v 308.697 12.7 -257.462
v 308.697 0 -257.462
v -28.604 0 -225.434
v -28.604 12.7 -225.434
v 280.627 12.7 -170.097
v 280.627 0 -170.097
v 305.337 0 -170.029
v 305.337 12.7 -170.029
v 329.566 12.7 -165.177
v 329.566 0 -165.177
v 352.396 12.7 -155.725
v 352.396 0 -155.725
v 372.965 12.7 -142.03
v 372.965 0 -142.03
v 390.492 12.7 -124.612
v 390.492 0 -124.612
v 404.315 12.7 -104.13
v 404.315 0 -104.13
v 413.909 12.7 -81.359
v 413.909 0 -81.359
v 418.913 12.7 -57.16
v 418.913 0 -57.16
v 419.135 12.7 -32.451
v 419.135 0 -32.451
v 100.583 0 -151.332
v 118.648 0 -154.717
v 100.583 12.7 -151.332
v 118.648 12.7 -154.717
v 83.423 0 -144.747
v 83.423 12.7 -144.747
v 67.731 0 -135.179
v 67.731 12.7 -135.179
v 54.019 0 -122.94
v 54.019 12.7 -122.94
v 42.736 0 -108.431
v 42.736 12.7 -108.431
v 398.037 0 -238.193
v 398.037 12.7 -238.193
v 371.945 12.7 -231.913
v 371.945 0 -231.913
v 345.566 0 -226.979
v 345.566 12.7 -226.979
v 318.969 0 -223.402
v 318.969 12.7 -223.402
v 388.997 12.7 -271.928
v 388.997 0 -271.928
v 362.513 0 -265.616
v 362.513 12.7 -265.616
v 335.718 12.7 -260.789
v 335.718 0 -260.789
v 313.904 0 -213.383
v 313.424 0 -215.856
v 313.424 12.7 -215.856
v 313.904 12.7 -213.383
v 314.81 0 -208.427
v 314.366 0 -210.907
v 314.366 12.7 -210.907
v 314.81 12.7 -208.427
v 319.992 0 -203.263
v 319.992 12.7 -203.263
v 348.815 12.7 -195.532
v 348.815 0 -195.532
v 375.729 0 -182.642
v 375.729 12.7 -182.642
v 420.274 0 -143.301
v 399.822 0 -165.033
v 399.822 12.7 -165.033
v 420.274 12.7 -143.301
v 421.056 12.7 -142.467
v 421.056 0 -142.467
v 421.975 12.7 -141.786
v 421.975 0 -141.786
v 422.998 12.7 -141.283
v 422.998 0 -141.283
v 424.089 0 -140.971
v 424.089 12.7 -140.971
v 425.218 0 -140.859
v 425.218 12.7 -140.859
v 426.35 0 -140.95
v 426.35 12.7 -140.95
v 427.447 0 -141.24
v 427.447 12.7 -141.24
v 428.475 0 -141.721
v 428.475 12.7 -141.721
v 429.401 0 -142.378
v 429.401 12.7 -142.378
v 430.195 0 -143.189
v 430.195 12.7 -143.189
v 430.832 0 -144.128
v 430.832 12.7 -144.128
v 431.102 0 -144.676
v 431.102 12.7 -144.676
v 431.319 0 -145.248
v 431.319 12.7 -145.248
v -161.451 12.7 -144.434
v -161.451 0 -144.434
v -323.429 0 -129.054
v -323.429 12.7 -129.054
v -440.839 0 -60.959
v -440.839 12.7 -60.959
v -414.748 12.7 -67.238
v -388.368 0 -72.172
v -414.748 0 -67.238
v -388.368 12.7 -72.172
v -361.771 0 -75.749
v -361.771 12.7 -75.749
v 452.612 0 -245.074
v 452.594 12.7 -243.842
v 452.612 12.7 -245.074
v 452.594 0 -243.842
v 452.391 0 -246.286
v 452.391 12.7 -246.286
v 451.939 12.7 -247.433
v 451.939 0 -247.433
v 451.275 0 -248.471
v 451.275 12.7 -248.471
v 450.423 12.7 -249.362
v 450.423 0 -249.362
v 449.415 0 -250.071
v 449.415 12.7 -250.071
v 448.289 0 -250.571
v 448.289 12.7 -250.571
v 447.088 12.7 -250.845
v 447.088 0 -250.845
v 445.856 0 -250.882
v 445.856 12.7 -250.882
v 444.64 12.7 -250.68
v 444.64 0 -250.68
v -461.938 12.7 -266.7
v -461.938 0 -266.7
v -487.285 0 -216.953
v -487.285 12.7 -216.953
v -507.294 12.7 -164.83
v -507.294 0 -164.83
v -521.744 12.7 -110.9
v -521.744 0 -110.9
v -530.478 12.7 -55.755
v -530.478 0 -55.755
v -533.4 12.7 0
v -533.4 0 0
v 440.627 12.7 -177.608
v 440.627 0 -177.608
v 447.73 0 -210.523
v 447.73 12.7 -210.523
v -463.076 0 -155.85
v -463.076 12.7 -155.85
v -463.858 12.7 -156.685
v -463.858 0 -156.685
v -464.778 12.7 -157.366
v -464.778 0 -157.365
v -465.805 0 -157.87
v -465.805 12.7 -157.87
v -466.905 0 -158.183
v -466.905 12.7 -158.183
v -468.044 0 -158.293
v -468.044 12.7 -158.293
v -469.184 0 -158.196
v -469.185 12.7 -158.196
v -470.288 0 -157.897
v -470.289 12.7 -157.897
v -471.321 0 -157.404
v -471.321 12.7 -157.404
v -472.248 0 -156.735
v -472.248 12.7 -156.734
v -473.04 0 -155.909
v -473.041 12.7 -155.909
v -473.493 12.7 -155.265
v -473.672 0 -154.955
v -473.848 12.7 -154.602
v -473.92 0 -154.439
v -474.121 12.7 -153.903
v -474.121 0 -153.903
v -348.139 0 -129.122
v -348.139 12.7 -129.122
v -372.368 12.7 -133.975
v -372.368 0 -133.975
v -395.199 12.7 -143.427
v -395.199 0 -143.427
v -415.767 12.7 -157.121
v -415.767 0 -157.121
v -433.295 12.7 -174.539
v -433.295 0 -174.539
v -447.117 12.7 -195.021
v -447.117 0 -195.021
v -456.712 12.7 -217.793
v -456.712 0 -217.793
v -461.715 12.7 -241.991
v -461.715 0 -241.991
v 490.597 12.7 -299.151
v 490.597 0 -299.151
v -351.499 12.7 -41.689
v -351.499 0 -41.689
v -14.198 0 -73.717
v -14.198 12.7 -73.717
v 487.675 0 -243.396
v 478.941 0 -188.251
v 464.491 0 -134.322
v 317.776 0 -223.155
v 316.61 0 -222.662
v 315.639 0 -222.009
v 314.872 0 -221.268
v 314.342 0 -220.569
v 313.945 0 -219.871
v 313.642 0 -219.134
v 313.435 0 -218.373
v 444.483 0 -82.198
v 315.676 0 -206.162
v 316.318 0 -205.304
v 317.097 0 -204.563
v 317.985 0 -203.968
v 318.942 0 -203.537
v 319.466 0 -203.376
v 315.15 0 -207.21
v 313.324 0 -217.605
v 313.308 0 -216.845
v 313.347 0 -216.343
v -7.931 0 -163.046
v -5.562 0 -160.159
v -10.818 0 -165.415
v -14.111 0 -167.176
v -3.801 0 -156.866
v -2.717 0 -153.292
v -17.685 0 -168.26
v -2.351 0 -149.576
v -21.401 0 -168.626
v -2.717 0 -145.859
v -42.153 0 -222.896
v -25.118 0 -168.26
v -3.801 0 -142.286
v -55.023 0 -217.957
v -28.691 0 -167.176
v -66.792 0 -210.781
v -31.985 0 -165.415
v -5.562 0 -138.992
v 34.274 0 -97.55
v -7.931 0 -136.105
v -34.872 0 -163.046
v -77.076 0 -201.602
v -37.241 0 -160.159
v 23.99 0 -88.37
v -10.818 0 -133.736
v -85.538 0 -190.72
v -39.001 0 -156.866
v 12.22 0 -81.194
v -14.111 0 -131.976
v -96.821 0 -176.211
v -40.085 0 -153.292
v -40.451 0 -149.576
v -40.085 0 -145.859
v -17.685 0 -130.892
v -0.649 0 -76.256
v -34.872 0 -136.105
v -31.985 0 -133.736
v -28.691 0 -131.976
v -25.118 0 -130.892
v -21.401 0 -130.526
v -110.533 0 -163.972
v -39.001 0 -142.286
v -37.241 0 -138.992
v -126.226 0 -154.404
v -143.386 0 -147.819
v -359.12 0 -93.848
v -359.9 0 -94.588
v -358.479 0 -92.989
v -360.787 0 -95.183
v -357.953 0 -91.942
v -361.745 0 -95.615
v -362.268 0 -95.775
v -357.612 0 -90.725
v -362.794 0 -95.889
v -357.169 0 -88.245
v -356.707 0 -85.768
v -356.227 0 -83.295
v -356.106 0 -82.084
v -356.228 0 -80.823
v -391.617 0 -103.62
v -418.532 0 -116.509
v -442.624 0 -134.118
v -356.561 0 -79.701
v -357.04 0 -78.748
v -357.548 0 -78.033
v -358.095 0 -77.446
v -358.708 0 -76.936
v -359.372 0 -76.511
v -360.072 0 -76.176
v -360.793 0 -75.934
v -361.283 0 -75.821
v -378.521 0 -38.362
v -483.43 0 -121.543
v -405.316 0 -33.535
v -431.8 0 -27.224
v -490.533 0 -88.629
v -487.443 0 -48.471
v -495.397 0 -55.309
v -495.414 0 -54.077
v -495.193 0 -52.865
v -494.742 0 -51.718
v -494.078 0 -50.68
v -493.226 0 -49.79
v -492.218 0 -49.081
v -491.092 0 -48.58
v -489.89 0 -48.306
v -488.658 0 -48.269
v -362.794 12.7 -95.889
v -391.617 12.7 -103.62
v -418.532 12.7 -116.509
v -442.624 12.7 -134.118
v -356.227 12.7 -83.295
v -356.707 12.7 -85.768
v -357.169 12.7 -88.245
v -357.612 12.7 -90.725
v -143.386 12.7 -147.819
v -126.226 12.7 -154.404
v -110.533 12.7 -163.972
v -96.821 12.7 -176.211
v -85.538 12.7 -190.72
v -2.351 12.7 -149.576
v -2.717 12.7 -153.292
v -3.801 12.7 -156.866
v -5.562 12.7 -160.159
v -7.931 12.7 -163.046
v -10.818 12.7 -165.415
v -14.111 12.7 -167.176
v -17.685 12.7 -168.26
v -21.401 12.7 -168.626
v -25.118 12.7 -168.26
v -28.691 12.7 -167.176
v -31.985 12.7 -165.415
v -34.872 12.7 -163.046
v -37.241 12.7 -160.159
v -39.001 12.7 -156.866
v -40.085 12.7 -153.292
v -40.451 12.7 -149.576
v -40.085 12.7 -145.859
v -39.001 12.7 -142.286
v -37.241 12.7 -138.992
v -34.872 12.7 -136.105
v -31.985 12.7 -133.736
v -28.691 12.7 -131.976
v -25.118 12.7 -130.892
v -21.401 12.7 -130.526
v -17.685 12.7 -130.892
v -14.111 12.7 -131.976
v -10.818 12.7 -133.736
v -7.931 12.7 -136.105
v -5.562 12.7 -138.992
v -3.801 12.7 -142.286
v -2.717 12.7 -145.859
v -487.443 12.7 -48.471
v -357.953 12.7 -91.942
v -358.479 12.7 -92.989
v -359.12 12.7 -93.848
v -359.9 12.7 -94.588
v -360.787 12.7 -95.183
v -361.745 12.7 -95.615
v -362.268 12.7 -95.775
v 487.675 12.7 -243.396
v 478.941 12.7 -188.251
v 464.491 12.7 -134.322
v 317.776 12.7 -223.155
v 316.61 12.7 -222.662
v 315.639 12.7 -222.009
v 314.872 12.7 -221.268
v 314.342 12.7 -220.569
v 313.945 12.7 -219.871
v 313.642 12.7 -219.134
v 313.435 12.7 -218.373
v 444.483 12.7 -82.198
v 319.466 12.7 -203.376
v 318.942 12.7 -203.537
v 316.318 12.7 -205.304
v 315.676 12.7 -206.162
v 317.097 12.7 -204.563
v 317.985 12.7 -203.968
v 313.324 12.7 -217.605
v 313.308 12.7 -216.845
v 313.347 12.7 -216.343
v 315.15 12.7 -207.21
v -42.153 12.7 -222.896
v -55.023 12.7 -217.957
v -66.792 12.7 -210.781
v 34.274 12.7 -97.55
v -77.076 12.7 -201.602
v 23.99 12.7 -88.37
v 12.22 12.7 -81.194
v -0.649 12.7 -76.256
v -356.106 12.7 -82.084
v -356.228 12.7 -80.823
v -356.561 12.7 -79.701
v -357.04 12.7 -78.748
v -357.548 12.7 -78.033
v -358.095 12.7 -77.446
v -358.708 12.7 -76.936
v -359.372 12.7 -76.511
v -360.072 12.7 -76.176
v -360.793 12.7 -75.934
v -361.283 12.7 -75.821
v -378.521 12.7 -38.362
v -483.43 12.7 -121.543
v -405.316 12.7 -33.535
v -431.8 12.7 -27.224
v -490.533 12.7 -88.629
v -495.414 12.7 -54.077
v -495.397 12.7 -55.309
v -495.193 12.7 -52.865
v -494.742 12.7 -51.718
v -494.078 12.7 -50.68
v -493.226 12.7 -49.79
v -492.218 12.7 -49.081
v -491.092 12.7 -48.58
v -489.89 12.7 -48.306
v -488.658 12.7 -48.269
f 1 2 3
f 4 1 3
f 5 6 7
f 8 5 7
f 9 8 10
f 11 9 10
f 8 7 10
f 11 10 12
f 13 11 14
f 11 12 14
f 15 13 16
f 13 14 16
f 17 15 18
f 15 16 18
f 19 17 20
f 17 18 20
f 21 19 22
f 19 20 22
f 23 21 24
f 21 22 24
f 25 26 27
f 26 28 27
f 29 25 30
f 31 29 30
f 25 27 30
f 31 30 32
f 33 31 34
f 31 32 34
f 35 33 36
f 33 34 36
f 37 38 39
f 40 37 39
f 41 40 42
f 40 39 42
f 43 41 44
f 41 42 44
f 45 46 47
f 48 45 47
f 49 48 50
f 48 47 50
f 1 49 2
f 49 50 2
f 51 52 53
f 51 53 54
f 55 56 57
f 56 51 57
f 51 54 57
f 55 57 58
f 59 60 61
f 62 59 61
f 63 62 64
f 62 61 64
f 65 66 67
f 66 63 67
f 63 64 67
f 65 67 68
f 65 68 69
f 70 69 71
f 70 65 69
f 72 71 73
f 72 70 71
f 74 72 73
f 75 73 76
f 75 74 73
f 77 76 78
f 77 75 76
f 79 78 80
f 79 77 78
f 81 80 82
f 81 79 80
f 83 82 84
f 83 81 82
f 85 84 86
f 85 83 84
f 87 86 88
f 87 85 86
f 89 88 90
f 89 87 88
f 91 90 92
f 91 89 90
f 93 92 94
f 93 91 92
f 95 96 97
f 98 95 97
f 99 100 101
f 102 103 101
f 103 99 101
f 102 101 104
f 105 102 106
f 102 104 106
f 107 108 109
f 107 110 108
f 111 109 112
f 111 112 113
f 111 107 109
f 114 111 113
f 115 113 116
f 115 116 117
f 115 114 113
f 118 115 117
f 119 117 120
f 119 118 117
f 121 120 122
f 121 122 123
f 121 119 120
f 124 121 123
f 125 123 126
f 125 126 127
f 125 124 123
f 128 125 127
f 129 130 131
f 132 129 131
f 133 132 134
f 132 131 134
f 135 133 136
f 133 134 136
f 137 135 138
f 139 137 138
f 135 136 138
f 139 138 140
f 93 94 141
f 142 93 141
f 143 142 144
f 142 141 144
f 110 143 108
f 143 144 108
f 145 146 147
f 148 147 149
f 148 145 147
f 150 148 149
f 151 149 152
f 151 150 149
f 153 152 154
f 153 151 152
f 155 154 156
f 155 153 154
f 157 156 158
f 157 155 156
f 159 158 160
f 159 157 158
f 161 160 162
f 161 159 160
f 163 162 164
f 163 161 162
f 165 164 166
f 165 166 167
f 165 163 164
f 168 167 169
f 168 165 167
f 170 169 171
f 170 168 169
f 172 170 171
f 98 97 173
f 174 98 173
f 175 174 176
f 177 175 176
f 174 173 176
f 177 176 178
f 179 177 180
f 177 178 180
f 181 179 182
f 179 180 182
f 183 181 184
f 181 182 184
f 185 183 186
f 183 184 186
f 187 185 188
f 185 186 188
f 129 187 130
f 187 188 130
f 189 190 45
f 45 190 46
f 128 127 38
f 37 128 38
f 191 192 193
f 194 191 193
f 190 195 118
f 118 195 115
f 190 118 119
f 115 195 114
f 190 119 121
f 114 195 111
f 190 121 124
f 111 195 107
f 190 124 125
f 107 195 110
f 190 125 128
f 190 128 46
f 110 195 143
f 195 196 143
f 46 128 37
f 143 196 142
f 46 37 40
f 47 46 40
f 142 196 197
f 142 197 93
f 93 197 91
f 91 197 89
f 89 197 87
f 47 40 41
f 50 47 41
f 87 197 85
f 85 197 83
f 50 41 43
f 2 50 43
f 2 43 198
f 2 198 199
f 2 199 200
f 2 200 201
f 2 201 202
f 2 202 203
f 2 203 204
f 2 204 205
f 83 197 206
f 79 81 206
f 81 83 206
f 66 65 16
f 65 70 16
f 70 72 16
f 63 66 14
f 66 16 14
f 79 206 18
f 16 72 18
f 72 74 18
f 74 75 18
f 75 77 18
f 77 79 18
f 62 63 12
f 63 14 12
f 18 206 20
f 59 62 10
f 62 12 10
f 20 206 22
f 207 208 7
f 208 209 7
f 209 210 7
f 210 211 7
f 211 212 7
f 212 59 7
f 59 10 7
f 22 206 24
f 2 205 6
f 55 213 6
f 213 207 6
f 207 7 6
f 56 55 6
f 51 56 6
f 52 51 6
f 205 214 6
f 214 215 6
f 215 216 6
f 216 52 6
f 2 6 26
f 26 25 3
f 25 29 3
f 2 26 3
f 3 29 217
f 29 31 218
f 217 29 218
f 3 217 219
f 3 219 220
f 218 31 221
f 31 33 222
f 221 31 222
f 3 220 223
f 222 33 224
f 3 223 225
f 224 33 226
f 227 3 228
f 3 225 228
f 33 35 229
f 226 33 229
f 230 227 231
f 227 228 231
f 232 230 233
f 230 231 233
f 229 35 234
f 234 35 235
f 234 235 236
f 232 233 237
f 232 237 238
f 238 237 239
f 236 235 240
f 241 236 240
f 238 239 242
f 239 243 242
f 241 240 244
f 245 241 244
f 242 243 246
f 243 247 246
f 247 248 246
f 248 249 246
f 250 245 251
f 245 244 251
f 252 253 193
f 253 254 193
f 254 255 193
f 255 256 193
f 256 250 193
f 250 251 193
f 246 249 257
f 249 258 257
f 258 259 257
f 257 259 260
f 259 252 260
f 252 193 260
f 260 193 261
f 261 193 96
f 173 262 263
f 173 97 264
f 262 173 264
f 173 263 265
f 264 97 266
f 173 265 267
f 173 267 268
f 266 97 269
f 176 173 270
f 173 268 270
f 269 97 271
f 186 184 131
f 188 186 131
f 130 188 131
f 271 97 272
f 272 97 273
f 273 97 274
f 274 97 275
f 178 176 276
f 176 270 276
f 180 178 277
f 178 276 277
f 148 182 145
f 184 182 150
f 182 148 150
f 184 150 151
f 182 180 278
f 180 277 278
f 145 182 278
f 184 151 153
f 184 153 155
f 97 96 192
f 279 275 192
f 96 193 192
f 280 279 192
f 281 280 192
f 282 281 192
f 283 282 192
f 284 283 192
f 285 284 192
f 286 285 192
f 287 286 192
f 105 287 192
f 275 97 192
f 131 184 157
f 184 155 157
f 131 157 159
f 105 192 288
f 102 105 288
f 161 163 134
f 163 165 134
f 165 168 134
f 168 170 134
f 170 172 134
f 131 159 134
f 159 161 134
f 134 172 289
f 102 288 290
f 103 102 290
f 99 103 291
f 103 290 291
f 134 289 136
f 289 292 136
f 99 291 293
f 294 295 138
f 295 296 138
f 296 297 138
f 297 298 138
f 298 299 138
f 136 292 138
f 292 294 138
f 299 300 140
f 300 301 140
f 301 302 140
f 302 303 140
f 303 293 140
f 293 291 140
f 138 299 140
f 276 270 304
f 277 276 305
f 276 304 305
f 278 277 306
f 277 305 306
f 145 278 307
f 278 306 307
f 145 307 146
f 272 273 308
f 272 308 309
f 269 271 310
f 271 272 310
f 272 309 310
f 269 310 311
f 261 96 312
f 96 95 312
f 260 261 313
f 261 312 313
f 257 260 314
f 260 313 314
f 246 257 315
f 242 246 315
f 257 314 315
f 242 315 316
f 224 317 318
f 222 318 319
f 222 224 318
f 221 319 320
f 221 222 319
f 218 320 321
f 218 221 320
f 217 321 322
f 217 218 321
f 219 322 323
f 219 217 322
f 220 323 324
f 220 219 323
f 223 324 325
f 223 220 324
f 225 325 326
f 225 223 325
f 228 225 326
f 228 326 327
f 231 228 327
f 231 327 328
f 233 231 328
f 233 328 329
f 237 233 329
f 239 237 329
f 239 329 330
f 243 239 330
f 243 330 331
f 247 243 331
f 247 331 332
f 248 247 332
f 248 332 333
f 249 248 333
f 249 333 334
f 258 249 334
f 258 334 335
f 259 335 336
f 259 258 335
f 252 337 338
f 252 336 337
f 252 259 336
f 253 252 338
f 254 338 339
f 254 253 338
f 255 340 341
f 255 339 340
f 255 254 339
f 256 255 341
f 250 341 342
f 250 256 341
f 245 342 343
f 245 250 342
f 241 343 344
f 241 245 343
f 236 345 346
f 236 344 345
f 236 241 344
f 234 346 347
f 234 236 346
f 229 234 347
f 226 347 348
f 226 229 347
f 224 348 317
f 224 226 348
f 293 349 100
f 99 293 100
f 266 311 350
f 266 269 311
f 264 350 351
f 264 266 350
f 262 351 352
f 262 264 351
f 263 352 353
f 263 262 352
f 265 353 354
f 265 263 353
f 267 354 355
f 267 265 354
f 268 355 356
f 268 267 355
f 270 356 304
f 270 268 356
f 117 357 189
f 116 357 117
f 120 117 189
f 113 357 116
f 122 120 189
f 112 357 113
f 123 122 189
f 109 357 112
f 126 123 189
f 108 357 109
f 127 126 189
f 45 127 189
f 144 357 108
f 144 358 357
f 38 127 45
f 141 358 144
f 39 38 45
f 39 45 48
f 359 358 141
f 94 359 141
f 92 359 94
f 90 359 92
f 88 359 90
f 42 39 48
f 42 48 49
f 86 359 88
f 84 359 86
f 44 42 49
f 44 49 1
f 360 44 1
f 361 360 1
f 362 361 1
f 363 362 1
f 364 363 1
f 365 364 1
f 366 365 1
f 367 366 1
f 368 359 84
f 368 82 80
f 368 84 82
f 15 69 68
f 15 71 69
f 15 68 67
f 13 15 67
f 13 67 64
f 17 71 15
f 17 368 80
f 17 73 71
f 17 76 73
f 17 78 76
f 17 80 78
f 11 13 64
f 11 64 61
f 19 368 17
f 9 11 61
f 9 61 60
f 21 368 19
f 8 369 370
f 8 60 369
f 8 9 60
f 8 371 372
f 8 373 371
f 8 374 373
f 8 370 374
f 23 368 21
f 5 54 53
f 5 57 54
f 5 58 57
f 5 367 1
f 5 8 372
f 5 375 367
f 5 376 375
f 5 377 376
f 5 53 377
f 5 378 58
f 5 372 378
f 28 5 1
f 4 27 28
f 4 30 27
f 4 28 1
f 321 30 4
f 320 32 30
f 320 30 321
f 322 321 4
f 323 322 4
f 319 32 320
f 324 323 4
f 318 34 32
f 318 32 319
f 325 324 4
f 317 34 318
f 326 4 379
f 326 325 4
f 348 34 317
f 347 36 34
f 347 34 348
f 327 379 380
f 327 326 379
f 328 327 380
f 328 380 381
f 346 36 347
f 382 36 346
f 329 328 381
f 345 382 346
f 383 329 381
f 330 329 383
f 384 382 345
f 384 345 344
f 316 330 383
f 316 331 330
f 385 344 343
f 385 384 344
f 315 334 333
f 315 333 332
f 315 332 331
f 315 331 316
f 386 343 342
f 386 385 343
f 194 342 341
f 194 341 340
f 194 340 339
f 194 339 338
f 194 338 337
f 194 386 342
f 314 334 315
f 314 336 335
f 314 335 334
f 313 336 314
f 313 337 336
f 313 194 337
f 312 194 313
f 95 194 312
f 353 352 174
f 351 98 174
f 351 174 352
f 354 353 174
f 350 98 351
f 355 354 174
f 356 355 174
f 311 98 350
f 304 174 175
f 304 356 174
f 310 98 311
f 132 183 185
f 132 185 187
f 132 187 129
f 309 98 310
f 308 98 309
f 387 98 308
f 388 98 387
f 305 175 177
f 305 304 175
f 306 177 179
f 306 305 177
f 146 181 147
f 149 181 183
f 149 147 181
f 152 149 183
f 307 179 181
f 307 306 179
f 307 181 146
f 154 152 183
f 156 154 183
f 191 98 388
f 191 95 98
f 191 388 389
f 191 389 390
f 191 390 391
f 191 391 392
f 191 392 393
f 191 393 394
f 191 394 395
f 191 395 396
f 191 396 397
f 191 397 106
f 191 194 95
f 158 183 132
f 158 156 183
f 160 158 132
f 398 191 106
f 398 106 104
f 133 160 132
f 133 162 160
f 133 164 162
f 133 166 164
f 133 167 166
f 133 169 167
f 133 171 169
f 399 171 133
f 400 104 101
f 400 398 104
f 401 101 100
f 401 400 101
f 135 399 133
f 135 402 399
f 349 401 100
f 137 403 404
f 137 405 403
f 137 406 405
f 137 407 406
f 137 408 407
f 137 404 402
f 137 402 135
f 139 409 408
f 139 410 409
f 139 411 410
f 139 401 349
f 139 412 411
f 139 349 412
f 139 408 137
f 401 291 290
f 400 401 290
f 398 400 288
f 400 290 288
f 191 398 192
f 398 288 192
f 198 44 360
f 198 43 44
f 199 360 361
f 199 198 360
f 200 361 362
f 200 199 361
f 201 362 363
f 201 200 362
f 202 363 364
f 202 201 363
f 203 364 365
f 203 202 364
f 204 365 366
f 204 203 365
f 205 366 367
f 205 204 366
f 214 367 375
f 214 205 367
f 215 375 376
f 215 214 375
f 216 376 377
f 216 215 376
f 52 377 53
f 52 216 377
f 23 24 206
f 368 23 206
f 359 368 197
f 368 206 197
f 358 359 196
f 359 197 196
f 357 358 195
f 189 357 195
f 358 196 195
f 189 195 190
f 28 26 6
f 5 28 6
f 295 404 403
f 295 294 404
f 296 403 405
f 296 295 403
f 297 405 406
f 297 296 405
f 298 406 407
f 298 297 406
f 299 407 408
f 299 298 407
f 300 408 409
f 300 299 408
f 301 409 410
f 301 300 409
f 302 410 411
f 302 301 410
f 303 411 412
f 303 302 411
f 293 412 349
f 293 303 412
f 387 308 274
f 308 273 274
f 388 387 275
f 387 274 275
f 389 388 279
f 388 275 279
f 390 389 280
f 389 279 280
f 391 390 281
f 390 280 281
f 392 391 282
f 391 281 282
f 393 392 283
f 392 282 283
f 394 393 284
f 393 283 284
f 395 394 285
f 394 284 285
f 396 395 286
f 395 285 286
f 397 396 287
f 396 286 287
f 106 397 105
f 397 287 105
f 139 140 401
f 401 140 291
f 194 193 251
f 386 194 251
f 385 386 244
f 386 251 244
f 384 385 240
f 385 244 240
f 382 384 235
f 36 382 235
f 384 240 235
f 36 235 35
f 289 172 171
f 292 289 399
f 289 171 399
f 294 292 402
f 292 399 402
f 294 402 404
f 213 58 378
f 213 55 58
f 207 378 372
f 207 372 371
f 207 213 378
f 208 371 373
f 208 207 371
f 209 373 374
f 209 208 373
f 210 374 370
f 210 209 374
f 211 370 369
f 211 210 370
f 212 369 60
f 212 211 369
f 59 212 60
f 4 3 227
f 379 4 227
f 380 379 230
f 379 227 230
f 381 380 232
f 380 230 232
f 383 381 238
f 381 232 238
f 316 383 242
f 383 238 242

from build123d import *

# Parameters (mm, degrees)
SKETCH1_R           = 76.2
SKETCH1_R_2         = 19.05
BOSS_EXTRUDE1_DEPTH = 12.7
CIRPATTERN1_COUNT   = 2
FILLET1_R           = 101.6
CUT_EXTRUDE2_DEPTH  = 13.7
FILLET2_R           = 6.35


with BuildPart() as part:
    # Sketch1 → Boss-Extrude1 (new body)
    with BuildSketch(Plane(origin=(0, 0, 0), x_dir=(1, 0, 0), z_dir=(0, 1, 0))):
        with BuildLine():
            ThreePointArc((-461.937950379, 266.7), (-515.224835743, 138.054078658), (-533.4, 0))
            Line((-533.4, 0), (-431.8, 27.223637951))
            ThreePointArc((-431.8, 27.223637951), (-391.951998133, 36.135119544), (-351.499222019, 41.689456733))
            Line((-351.499222019, 41.689456733), (-14.198340678, 73.716868009))
            ThreePointArc((-14.198340678, 73.716868009), (-73.012974959, 93.516111014), (-97.595715318, 150.497336919))
            Line((-97.595715318, 150.497336919), (-323.429158368, 129.053987789))
            ThreePointArc((-323.429158368, 129.053987789), (-424.955630689, 165.402632783), (-461.937950379, 266.7))
        make_face()
        with Locations((-21.401289496, 149.575667949)):
            Circle(SKETCH1_R)
        with Locations((-21.401289496, 149.575667949)):
            Circle(SKETCH1_R_2, mode=Mode.SUBTRACT)
    boss_extrude1 = extrude(amount=BOSS_EXTRUDE1_DEPTH)

    # CirPattern1: Boss-Extrude1 ×2 about axis
    cirpattern1_axis = Axis((-21.401289496, 0, -149.575667949), (0, 1, 0))
    for i in range(1, CIRPATTERN1_COUNT):
        add(boss_extrude1.rotate(cirpattern1_axis, i * 360 / CIRPATTERN1_COUNT))

    # Fillet1
    fillet1_edges = [part.edges().sort_by_distance(p)[0] for p in [
        (-97.595715318, 6.35, -150.497336919),
        (54.793136326, 6.35, -148.653998979),
    ]]
    fillet(fillet1_edges, radius=FILLET1_R)

    # Sketch3 → Cut-Extrude2 (cut, through all)
    with BuildSketch(Plane(origin=(0, 12.7, 0), x_dir=(1, 0, 0), z_dir=(0, 1, 0))):
        with BuildLine():
            ThreePointArc((-354.80057356, 76.458073372), (-356.713011165, 85.800166676), (-358.363729661, 95.192038339))
            ThreePointArc((-358.363729661, 95.192038339), (-421.769213749, 118.496456117), (-470.148687166, 165.642801175))
            ThreePointArc((-470.148687166, 165.642801175), (-486.927538331, 106.671917768), (-496.339895031, 46.087245799))
            Line((-496.339895031, 46.087245799), (-440.83925515, 60.958597434))
            ThreePointArc((-440.83925515, 60.958597434), (-398.143908594, 70.506850222), (-354.80057356, 76.458073372))
        make_face()
        with BuildLine():
            ThreePointArc((398.036676158, 238.192738464), (355.341329602, 228.644485675), (311.997994568, 222.693262526))
            ThreePointArc((311.997994568, 222.693262526), (313.910432173, 213.351169222), (315.561150668, 203.959297559))
            ThreePointArc((315.561150668, 203.959297559), (378.966634757, 180.654879781), (427.346108174, 133.508534723))
            ThreePointArc((427.346108174, 133.508534723), (444.124959338, 192.47941813), (453.537316039, 253.064090099))
            Line((453.537316039, 253.064090099), (398.036676158, 238.192738464))
        make_face()
    extrude(amount=-CUT_EXTRUDE2_DEPTH, mode=Mode.SUBTRACT)

    # Fillet2
    fillet2_edges = [part.edges().sort_by_distance(p)[0] for p in [
        (-354.80057356, 6.35, -76.458073372),
        (-496.339895031, 6.35, -46.087245799),
        (-470.148687166, 6.35, -165.642801175),
        (-358.363729661, 6.35, -95.192038339),
        (311.997994568, 6.35, -222.693262526),
        (453.537316039, 6.35, -253.064090099),
        (427.346108174, 6.35, -133.508534723),
        (315.561150668, 6.35, -203.959297559),
    ]]
    fillet(fillet2_edges, radius=FILLET2_R)


solid = part.part
